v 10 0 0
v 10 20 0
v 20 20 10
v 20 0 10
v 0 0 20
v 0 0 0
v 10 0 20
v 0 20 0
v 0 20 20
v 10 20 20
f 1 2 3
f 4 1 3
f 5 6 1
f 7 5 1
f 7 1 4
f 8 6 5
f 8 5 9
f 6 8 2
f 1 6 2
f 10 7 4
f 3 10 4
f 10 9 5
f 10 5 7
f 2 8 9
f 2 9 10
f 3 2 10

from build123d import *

# Parameters (mm, degrees)
SKETCH1_W           = 20
SKETCH1_H           = 20
BOSS_EXTRUDE1_DEPTH = 20
CUT_EXTRUDE1_DEPTH  = 20
CUT_EXTRUDE2_DEPTH  = 20


with BuildPart() as part:
    # Sketch1 → Boss-Extrude1 (new body)
    with BuildSketch(Plane.XY):
        with Locations((10, 10)):
            Rectangle(SKETCH1_W, SKETCH1_H)
    extrude(amount=BOSS_EXTRUDE1_DEPTH)

    # Sketch2 → Cut-Extrude1 (cut)
    with BuildSketch(Plane(origin=(0, 20, 0), x_dir=(1, 0, 0), z_dir=(0, 1, 0))):
        Polygon((20, 0), (10, 0), (20, -10), align=None)
    extrude(amount=-CUT_EXTRUDE1_DEPTH, mode=Mode.SUBTRACT)

    # Sketch3 → Cut-Extrude2 (cut)
    with BuildSketch(Plane(origin=(0, 20, 0), x_dir=(1, 0, 0), z_dir=(0, 1, 0))):
        Polygon((20, -20), (10, -20), (20, -10), align=None)
    extrude(amount=-CUT_EXTRUDE2_DEPTH, mode=Mode.SUBTRACT)


solid = part.part
